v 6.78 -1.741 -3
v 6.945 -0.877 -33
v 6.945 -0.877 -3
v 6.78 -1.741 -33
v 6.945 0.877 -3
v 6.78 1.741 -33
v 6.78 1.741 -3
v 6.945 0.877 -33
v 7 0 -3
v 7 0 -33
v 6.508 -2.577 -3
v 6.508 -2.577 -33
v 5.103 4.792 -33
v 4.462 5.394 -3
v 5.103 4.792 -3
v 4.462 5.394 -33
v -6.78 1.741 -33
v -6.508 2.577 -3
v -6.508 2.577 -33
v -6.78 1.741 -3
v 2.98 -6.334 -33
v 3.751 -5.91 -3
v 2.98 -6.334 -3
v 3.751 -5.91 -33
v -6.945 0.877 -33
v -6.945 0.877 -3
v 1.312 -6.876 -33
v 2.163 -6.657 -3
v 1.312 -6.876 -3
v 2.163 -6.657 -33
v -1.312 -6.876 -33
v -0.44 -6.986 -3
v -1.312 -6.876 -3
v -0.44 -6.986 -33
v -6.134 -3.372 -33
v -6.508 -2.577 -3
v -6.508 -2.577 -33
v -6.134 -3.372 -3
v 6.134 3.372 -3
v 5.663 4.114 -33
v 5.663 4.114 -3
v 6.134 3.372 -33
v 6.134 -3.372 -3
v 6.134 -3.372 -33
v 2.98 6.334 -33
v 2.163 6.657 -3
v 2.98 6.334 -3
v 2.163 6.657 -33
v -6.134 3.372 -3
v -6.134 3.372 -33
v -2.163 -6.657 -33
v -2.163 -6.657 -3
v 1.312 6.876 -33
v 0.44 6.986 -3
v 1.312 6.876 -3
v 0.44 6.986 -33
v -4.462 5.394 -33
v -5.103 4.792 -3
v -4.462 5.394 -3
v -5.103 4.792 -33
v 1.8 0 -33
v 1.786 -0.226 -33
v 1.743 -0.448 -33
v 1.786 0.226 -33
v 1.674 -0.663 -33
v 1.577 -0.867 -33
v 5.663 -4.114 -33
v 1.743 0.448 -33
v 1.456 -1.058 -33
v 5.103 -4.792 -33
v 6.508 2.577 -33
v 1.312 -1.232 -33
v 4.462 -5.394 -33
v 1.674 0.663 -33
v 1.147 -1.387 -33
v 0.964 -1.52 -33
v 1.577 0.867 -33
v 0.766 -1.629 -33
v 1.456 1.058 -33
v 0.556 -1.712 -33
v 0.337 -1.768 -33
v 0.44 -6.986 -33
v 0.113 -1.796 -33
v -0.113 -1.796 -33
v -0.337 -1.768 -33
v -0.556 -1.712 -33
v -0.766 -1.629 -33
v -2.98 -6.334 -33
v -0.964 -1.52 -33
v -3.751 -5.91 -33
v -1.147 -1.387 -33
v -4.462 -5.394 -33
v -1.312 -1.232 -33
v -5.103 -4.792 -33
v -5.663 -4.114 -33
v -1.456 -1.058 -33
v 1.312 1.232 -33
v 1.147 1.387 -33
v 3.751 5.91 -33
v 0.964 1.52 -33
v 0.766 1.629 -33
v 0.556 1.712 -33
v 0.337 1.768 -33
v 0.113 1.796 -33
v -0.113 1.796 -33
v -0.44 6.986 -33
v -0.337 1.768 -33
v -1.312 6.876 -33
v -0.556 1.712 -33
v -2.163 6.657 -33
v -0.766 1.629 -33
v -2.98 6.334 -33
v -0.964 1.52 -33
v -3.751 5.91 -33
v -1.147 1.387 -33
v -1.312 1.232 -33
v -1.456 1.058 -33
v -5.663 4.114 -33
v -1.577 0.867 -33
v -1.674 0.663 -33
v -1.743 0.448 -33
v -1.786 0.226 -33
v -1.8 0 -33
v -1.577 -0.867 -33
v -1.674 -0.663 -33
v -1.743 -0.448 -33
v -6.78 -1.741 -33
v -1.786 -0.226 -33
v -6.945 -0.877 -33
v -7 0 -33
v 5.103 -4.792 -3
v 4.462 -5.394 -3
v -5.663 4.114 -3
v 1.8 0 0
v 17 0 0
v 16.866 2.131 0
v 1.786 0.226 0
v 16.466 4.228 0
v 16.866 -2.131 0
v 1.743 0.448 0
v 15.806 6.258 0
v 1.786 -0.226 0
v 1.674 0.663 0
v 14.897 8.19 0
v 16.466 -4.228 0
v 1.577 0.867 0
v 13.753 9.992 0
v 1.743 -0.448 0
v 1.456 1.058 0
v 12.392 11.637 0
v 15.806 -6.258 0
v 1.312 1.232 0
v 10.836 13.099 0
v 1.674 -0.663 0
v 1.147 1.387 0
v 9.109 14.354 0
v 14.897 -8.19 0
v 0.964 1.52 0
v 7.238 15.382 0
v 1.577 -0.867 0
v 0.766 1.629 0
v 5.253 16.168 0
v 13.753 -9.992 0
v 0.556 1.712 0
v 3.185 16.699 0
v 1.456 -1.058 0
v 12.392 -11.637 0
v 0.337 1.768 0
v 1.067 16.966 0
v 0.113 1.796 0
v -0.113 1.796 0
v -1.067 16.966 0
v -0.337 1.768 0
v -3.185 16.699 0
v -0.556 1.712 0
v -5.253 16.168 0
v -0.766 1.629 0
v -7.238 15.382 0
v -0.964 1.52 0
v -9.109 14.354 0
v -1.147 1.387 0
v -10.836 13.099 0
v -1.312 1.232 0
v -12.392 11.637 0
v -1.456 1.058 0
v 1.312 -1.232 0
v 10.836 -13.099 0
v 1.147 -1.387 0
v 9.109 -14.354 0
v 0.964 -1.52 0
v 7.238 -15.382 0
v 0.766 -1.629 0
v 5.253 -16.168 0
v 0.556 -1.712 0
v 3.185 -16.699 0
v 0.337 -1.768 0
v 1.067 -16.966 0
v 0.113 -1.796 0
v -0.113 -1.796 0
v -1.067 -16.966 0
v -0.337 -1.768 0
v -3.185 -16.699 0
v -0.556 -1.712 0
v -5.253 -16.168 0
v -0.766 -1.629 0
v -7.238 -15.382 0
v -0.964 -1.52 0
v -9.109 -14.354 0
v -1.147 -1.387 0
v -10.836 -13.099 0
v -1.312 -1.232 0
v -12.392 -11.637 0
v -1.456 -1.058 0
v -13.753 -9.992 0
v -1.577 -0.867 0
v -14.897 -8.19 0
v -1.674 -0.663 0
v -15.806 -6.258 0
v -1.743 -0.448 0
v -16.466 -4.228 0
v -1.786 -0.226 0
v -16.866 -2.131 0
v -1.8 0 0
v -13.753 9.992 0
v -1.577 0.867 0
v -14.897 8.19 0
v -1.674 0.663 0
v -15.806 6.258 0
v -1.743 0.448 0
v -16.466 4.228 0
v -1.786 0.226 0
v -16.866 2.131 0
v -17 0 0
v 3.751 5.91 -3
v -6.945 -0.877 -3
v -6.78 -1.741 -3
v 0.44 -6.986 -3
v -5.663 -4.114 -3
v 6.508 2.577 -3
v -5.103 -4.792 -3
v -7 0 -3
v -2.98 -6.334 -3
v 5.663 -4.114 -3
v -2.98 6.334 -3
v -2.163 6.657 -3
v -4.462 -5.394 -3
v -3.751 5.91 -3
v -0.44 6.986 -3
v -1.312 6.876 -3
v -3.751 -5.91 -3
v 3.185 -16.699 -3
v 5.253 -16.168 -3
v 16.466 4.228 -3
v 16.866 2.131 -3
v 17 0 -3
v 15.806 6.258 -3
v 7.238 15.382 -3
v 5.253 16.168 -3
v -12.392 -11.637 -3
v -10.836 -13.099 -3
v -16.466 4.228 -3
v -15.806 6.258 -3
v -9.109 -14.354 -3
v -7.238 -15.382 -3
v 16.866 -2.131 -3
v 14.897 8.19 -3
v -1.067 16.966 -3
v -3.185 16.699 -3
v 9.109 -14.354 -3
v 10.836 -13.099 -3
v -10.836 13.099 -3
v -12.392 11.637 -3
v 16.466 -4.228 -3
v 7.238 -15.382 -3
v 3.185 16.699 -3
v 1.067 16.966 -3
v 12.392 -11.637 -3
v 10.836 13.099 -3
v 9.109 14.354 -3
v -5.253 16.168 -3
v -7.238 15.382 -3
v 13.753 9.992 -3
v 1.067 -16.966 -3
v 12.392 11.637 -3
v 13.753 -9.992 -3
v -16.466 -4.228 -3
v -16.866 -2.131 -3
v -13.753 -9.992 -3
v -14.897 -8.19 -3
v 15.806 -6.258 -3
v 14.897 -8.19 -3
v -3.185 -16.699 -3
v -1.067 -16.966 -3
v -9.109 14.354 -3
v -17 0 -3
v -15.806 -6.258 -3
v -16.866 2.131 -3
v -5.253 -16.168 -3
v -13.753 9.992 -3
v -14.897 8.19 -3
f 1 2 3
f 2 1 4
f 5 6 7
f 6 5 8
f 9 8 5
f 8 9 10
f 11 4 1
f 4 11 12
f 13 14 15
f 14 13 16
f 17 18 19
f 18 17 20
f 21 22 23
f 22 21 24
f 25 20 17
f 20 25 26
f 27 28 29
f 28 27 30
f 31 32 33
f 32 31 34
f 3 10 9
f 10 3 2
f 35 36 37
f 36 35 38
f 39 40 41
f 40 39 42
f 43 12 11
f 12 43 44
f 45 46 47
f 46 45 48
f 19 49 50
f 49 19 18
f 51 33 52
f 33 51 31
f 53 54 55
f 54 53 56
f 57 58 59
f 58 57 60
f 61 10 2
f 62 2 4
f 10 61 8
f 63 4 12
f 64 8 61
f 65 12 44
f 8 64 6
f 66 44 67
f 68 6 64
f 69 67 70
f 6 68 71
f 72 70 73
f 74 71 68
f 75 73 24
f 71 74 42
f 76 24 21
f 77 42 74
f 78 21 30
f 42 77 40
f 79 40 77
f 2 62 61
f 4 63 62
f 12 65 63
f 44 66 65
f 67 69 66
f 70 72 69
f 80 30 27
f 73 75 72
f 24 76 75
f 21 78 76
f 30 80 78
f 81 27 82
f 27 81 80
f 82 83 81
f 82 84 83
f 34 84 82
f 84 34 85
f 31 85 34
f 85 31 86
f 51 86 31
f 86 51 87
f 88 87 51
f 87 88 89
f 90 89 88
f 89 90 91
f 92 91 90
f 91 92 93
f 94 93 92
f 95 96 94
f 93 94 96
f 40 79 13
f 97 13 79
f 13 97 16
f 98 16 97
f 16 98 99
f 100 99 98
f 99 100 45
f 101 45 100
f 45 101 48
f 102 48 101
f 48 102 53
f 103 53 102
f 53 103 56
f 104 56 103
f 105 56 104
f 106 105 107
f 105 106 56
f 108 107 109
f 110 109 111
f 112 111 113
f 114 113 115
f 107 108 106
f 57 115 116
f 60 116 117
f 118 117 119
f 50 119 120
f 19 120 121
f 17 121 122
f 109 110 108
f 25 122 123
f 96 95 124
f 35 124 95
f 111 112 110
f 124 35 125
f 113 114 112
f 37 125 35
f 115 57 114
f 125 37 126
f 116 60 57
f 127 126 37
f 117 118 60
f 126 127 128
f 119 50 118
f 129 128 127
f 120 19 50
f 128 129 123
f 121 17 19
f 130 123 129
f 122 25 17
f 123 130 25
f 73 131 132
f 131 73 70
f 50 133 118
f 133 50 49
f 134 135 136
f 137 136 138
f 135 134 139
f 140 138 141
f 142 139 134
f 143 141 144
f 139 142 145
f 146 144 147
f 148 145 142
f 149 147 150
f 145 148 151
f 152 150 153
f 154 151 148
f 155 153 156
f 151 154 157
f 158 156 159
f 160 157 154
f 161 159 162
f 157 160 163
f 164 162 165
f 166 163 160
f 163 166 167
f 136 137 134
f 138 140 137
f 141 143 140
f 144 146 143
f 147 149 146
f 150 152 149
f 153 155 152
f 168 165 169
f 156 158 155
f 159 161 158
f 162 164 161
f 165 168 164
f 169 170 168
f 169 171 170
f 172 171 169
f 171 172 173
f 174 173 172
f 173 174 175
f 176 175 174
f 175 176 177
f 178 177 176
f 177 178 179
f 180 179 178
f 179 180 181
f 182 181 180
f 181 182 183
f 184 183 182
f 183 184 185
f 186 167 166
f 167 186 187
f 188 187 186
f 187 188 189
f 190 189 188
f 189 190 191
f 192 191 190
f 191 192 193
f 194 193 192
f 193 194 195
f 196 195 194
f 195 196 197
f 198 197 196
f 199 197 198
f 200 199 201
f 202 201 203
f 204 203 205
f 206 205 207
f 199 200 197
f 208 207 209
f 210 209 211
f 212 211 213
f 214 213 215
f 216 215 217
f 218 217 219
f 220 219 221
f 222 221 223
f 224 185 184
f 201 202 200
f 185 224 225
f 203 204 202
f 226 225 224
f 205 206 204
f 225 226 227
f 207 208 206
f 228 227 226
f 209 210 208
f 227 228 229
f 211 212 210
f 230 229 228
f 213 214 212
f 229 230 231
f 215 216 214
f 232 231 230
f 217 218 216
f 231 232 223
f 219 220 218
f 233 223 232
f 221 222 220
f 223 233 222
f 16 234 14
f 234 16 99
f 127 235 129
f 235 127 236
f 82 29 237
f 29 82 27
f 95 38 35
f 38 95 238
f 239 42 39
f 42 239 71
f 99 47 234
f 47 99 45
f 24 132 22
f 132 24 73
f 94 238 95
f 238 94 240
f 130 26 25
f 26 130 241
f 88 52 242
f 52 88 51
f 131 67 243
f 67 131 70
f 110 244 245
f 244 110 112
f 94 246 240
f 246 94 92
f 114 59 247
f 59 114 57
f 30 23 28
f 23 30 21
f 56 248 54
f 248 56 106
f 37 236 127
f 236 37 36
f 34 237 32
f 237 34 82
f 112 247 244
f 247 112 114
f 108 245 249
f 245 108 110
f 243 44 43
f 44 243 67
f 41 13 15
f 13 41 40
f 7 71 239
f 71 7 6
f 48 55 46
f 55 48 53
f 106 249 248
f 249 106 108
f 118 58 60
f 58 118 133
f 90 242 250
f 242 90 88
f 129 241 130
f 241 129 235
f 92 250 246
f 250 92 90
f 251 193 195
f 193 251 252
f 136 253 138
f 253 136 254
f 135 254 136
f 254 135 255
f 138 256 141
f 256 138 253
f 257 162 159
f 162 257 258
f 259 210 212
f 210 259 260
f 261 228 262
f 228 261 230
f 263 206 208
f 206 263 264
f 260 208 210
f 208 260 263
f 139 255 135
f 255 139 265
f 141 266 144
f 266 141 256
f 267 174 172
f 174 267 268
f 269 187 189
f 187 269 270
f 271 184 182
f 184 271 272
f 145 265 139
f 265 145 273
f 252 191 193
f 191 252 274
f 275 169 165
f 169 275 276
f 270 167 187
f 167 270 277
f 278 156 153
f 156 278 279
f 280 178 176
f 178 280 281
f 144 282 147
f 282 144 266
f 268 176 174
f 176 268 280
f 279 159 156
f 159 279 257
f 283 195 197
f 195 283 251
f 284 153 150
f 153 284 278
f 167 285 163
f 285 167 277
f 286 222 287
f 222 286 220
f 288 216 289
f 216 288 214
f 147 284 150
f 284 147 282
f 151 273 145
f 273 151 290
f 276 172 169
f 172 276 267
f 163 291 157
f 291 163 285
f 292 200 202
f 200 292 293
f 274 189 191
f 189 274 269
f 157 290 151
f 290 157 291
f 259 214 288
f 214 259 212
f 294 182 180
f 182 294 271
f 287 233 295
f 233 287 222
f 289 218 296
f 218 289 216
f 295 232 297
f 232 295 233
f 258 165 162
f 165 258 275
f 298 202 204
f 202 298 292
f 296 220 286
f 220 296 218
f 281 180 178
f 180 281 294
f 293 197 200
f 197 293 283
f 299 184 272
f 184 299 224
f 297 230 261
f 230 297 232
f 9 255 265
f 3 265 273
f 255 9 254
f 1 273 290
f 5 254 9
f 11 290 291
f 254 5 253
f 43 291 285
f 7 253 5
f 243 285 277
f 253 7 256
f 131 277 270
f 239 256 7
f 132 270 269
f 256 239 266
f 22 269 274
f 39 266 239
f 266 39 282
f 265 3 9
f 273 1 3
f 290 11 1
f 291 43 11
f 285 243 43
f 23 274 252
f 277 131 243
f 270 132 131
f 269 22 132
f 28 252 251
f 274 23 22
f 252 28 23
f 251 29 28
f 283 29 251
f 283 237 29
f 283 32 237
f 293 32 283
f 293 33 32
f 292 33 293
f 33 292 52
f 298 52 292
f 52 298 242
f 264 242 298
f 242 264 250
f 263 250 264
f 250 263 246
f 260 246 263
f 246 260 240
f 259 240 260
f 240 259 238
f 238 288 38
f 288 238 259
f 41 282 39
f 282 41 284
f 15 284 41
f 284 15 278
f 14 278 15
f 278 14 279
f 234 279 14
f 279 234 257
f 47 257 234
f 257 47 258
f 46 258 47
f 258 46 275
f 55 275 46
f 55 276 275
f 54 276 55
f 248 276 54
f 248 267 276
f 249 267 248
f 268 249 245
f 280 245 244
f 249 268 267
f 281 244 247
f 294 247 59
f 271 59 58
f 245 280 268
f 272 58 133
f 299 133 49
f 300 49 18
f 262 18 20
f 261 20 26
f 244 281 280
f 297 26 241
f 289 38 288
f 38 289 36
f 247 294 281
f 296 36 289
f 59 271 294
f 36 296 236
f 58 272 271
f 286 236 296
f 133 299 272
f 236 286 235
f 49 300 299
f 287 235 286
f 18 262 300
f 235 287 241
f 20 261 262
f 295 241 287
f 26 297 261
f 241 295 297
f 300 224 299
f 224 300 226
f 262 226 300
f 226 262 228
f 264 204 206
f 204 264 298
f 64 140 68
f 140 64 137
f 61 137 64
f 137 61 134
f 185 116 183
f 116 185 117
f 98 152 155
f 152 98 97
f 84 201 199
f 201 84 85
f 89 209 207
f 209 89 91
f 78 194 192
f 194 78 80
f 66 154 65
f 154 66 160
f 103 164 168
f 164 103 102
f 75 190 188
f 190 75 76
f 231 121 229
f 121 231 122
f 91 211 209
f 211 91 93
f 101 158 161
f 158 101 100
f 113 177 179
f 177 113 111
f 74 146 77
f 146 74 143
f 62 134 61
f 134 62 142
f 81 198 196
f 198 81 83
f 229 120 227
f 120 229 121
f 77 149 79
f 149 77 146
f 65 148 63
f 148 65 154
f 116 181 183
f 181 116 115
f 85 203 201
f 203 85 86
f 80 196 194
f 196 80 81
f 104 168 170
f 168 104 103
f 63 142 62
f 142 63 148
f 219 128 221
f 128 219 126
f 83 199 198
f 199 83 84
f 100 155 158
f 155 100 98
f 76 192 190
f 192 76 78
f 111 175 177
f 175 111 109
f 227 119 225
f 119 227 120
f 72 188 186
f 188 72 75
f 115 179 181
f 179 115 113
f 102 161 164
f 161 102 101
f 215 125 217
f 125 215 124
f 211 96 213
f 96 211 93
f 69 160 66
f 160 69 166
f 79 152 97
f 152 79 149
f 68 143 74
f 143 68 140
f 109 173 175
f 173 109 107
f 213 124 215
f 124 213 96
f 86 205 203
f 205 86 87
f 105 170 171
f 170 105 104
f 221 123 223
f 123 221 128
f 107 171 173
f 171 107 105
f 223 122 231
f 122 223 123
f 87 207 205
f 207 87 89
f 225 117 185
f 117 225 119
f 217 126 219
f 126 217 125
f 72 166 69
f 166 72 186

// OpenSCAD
$fn = 50;


difference() {
	union() {
		translate(v = [0, 0, -33.0000000000]) {
			cylinder(h = 33, r = 7.0000000000);
		}
		translate(v = [0, 0, -3.0000000000]) {
			cylinder(h = 3, r = 17.0000000000);
		}
	}
	union() {
		#translate(v = [0, 0, -33]) {
			cylinder(h = 33, r = 1.8000000000);
		}
	}
}
